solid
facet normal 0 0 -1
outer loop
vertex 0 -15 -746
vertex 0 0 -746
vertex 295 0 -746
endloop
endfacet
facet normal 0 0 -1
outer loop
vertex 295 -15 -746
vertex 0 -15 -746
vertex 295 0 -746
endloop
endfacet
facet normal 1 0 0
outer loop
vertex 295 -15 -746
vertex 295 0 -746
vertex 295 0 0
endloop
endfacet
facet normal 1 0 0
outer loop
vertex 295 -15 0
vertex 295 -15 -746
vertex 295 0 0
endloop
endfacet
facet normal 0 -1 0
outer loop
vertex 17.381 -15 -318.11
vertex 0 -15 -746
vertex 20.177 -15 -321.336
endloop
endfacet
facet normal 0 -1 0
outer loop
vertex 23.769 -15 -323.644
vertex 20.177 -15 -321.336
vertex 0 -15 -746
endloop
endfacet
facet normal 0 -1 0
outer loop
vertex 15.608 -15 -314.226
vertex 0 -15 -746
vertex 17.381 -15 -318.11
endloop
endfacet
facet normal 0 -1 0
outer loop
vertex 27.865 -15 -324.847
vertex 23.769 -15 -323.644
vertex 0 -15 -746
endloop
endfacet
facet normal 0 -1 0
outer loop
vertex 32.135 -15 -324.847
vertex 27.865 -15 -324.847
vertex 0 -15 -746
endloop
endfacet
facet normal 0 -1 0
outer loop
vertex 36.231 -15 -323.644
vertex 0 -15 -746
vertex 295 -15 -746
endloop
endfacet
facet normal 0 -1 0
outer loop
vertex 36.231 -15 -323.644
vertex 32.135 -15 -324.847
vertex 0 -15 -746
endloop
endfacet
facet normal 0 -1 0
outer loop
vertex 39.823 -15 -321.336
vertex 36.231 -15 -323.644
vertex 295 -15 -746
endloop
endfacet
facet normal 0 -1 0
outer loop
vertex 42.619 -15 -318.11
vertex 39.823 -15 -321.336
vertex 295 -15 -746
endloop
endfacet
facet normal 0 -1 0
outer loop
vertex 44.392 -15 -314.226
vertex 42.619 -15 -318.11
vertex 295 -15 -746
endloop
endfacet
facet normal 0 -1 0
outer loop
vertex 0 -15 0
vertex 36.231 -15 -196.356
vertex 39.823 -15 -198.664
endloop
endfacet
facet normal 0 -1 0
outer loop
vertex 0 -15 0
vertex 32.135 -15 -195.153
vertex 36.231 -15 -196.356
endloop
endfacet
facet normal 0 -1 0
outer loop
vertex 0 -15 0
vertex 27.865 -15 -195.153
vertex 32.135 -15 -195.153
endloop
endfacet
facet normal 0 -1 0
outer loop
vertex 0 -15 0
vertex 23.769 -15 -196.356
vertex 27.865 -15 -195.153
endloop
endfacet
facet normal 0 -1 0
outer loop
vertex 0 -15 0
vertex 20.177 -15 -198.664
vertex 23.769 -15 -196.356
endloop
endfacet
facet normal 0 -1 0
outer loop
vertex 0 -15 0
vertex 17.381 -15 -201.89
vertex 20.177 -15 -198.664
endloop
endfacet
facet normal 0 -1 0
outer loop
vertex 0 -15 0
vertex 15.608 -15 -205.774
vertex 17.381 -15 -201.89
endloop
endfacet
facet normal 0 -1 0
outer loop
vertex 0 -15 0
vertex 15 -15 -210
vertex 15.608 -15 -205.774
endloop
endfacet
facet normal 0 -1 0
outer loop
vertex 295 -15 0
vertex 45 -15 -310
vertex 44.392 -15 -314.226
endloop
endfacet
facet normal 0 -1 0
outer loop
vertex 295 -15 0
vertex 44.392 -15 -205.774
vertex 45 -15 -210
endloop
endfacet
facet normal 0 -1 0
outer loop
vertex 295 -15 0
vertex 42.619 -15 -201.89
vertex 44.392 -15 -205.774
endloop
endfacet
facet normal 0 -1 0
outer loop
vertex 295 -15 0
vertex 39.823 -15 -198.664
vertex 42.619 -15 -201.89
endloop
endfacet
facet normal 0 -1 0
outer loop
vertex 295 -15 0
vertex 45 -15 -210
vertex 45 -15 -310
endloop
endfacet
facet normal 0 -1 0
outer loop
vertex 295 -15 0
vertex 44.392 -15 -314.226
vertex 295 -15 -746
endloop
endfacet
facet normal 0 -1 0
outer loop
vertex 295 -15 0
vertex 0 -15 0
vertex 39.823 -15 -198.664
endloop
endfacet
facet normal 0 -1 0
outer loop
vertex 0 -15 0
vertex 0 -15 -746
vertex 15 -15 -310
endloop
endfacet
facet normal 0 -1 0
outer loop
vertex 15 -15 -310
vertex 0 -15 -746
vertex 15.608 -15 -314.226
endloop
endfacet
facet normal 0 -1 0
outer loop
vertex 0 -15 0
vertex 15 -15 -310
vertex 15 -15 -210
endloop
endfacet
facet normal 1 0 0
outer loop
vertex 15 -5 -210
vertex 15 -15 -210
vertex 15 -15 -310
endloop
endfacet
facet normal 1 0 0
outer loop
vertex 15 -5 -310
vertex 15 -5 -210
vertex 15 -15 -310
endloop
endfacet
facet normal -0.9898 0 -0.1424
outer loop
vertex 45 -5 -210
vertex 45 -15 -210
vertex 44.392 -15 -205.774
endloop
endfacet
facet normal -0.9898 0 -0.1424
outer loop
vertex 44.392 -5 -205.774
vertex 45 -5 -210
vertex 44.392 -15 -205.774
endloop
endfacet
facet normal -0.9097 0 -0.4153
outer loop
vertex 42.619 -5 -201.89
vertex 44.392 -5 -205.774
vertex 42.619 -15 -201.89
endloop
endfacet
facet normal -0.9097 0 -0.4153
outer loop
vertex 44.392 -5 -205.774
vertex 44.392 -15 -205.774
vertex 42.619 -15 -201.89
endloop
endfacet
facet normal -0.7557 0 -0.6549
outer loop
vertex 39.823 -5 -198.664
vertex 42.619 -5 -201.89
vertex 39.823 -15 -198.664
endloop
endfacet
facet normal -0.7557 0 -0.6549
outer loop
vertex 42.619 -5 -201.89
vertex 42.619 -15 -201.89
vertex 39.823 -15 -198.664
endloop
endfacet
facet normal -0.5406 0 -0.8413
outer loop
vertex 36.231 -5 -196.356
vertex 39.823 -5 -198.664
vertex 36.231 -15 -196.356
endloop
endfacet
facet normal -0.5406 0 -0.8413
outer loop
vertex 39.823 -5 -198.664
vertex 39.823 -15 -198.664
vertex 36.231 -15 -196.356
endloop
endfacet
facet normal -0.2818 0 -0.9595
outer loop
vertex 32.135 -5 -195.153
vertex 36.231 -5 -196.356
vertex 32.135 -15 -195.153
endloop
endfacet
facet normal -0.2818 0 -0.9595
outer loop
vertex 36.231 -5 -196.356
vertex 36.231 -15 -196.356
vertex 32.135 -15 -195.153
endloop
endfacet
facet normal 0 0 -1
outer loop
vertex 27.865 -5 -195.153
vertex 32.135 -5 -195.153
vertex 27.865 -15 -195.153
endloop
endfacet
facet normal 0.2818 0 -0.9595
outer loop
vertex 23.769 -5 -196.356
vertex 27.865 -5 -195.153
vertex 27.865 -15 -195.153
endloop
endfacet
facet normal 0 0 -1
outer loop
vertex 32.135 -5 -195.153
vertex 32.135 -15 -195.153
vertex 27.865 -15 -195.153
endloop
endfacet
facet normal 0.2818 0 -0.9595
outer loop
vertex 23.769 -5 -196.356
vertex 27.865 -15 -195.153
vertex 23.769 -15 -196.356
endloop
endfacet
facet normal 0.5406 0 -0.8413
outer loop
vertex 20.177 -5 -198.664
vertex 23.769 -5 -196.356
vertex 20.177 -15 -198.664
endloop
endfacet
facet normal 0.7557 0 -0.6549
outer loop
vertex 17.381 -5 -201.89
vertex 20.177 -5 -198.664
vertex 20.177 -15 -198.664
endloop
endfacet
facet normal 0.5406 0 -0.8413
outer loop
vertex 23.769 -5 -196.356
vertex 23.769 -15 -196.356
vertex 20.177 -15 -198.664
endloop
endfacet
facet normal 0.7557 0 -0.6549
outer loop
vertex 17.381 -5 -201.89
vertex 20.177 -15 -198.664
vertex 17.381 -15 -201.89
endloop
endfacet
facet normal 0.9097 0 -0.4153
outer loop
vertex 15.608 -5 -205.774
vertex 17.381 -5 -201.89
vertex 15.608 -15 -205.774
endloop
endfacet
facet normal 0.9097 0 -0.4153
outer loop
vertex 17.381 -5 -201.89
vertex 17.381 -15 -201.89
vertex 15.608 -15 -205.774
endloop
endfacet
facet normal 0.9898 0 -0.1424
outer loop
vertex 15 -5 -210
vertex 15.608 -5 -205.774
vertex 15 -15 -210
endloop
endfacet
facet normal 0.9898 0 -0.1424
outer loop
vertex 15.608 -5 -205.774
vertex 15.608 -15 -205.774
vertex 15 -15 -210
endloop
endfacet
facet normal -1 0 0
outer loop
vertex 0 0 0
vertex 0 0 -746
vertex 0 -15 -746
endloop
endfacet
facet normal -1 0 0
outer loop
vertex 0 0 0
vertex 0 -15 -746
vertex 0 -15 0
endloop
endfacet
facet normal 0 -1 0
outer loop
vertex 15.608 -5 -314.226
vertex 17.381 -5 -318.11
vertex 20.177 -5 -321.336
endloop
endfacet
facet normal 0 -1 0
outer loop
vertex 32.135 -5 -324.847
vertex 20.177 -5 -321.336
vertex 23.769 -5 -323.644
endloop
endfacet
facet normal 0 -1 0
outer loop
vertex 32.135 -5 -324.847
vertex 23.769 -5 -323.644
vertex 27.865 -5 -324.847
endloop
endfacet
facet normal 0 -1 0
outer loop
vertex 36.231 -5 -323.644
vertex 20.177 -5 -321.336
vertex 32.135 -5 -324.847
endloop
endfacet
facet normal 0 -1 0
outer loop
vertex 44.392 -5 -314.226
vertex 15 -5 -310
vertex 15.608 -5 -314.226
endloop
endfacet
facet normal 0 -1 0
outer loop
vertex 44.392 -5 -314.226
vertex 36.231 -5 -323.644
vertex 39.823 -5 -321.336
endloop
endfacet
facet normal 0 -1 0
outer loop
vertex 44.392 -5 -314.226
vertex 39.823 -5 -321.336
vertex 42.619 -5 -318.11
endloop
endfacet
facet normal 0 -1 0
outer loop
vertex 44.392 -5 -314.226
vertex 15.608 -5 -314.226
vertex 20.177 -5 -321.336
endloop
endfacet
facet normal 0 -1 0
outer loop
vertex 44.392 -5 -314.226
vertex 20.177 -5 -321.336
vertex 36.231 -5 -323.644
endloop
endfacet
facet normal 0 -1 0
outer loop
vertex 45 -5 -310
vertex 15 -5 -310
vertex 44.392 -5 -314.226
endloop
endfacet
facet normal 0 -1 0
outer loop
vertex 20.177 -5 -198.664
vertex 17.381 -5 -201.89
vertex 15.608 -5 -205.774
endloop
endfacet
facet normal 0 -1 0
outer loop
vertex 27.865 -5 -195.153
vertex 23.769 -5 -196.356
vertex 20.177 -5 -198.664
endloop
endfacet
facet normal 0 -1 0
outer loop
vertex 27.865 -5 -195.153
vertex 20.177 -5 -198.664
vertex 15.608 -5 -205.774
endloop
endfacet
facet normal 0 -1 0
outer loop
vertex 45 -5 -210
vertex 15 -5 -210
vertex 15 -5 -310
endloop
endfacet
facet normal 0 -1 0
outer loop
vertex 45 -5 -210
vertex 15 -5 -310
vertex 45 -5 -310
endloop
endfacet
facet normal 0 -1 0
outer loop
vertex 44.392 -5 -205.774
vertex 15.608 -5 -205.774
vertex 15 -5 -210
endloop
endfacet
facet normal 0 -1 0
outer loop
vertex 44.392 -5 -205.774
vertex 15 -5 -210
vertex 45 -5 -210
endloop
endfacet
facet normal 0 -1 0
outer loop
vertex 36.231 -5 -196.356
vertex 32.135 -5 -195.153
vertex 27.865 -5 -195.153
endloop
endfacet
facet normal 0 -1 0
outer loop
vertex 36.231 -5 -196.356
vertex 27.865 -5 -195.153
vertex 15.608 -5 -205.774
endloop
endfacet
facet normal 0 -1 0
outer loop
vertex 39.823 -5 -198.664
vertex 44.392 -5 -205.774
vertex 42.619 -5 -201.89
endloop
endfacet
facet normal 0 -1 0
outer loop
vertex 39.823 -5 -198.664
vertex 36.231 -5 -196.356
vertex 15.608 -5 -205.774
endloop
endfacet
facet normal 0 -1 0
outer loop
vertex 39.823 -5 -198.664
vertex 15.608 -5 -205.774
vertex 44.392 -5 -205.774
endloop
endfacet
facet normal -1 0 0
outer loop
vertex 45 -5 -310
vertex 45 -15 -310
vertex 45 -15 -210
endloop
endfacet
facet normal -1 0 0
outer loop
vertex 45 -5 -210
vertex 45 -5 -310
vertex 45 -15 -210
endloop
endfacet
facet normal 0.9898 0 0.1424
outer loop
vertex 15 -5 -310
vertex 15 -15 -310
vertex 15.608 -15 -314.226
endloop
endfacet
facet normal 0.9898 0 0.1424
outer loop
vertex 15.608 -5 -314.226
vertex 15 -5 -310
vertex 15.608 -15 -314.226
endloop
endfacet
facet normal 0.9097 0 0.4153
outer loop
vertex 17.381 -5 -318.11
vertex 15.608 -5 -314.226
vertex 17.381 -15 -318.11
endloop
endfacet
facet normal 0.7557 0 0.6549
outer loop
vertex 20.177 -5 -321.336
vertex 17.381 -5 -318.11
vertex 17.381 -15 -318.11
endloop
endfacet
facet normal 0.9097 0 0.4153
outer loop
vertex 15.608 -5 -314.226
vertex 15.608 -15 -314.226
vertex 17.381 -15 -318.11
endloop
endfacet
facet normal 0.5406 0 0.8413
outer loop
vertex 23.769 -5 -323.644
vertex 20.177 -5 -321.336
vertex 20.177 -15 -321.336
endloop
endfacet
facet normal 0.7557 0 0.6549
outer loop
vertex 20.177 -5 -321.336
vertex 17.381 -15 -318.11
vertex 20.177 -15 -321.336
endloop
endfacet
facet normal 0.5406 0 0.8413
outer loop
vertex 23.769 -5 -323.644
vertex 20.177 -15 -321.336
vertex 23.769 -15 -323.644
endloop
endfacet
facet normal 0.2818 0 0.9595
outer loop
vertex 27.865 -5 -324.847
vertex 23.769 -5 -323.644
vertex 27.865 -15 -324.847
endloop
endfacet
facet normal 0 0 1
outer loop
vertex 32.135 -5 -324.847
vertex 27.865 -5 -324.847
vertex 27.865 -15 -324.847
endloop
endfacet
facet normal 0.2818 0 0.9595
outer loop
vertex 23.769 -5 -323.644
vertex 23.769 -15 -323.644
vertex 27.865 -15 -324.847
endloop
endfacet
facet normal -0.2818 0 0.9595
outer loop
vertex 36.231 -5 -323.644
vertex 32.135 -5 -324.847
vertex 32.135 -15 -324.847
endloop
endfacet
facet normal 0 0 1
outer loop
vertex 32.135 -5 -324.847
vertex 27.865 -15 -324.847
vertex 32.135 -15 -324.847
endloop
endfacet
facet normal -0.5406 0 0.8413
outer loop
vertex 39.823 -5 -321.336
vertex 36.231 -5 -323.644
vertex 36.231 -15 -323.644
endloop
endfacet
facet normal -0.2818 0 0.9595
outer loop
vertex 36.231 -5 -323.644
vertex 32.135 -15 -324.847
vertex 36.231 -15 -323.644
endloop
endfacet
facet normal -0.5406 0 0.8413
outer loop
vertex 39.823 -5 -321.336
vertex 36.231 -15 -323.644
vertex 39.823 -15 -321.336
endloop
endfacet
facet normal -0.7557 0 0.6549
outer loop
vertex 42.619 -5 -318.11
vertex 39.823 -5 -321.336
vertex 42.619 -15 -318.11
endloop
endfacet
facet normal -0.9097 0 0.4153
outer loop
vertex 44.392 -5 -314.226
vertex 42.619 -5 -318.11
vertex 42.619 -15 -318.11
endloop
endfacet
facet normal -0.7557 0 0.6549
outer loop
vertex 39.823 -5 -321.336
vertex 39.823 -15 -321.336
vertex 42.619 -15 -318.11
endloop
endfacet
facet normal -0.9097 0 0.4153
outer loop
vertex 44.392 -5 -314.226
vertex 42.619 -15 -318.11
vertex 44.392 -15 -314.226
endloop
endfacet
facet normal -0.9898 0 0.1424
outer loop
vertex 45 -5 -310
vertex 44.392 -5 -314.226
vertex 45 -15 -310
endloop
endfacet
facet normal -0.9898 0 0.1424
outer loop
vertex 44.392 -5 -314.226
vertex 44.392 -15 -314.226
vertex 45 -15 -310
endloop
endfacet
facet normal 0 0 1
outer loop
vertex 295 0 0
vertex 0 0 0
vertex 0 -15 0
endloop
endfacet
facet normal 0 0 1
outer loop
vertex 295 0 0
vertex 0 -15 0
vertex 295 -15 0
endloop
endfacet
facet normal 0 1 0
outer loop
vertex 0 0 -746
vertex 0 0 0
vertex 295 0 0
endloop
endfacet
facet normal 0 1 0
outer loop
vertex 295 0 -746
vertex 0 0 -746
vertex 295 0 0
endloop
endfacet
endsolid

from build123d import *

# Parameters (mm, degrees)
F0_W     = 295
F0_H     = 746
F1_DEPTH = 15
F3_DEPTH = 10


with BuildPart() as f1:
    # F0 (on Front) → F1 (new body)
    with BuildSketch(Plane.XZ):
        with Locations((147.5, -373)):
            Rectangle(F0_W, F0_H)
    extrude(amount=F1_DEPTH)

    # F2 (on face) → F3 (cut)
    with BuildSketch(Plane.XZ.offset(15)):
        with BuildLine():
            ThreePointArc((15, -310), (30, -325), (45, -310))
            ThreePointArc((45, -310), (30, -295), (15, -310))
        make_face()
        with BuildLine():
            Line((45, -310), (45, -210))
            ThreePointArc((45, -210), (30, -225), (15, -210))
            Line((15, -210), (15, -310))
            ThreePointArc((15, -310), (30, -295), (45, -310))
        make_face()
        with BuildLine():
            ThreePointArc((15, -210), (30, -225), (45, -210))
            ThreePointArc((45, -210), (30, -195), (15, -210))
        make_face()
    extrude(amount=-F3_DEPTH, mode=Mode.SUBTRACT)


solid = f1.part
